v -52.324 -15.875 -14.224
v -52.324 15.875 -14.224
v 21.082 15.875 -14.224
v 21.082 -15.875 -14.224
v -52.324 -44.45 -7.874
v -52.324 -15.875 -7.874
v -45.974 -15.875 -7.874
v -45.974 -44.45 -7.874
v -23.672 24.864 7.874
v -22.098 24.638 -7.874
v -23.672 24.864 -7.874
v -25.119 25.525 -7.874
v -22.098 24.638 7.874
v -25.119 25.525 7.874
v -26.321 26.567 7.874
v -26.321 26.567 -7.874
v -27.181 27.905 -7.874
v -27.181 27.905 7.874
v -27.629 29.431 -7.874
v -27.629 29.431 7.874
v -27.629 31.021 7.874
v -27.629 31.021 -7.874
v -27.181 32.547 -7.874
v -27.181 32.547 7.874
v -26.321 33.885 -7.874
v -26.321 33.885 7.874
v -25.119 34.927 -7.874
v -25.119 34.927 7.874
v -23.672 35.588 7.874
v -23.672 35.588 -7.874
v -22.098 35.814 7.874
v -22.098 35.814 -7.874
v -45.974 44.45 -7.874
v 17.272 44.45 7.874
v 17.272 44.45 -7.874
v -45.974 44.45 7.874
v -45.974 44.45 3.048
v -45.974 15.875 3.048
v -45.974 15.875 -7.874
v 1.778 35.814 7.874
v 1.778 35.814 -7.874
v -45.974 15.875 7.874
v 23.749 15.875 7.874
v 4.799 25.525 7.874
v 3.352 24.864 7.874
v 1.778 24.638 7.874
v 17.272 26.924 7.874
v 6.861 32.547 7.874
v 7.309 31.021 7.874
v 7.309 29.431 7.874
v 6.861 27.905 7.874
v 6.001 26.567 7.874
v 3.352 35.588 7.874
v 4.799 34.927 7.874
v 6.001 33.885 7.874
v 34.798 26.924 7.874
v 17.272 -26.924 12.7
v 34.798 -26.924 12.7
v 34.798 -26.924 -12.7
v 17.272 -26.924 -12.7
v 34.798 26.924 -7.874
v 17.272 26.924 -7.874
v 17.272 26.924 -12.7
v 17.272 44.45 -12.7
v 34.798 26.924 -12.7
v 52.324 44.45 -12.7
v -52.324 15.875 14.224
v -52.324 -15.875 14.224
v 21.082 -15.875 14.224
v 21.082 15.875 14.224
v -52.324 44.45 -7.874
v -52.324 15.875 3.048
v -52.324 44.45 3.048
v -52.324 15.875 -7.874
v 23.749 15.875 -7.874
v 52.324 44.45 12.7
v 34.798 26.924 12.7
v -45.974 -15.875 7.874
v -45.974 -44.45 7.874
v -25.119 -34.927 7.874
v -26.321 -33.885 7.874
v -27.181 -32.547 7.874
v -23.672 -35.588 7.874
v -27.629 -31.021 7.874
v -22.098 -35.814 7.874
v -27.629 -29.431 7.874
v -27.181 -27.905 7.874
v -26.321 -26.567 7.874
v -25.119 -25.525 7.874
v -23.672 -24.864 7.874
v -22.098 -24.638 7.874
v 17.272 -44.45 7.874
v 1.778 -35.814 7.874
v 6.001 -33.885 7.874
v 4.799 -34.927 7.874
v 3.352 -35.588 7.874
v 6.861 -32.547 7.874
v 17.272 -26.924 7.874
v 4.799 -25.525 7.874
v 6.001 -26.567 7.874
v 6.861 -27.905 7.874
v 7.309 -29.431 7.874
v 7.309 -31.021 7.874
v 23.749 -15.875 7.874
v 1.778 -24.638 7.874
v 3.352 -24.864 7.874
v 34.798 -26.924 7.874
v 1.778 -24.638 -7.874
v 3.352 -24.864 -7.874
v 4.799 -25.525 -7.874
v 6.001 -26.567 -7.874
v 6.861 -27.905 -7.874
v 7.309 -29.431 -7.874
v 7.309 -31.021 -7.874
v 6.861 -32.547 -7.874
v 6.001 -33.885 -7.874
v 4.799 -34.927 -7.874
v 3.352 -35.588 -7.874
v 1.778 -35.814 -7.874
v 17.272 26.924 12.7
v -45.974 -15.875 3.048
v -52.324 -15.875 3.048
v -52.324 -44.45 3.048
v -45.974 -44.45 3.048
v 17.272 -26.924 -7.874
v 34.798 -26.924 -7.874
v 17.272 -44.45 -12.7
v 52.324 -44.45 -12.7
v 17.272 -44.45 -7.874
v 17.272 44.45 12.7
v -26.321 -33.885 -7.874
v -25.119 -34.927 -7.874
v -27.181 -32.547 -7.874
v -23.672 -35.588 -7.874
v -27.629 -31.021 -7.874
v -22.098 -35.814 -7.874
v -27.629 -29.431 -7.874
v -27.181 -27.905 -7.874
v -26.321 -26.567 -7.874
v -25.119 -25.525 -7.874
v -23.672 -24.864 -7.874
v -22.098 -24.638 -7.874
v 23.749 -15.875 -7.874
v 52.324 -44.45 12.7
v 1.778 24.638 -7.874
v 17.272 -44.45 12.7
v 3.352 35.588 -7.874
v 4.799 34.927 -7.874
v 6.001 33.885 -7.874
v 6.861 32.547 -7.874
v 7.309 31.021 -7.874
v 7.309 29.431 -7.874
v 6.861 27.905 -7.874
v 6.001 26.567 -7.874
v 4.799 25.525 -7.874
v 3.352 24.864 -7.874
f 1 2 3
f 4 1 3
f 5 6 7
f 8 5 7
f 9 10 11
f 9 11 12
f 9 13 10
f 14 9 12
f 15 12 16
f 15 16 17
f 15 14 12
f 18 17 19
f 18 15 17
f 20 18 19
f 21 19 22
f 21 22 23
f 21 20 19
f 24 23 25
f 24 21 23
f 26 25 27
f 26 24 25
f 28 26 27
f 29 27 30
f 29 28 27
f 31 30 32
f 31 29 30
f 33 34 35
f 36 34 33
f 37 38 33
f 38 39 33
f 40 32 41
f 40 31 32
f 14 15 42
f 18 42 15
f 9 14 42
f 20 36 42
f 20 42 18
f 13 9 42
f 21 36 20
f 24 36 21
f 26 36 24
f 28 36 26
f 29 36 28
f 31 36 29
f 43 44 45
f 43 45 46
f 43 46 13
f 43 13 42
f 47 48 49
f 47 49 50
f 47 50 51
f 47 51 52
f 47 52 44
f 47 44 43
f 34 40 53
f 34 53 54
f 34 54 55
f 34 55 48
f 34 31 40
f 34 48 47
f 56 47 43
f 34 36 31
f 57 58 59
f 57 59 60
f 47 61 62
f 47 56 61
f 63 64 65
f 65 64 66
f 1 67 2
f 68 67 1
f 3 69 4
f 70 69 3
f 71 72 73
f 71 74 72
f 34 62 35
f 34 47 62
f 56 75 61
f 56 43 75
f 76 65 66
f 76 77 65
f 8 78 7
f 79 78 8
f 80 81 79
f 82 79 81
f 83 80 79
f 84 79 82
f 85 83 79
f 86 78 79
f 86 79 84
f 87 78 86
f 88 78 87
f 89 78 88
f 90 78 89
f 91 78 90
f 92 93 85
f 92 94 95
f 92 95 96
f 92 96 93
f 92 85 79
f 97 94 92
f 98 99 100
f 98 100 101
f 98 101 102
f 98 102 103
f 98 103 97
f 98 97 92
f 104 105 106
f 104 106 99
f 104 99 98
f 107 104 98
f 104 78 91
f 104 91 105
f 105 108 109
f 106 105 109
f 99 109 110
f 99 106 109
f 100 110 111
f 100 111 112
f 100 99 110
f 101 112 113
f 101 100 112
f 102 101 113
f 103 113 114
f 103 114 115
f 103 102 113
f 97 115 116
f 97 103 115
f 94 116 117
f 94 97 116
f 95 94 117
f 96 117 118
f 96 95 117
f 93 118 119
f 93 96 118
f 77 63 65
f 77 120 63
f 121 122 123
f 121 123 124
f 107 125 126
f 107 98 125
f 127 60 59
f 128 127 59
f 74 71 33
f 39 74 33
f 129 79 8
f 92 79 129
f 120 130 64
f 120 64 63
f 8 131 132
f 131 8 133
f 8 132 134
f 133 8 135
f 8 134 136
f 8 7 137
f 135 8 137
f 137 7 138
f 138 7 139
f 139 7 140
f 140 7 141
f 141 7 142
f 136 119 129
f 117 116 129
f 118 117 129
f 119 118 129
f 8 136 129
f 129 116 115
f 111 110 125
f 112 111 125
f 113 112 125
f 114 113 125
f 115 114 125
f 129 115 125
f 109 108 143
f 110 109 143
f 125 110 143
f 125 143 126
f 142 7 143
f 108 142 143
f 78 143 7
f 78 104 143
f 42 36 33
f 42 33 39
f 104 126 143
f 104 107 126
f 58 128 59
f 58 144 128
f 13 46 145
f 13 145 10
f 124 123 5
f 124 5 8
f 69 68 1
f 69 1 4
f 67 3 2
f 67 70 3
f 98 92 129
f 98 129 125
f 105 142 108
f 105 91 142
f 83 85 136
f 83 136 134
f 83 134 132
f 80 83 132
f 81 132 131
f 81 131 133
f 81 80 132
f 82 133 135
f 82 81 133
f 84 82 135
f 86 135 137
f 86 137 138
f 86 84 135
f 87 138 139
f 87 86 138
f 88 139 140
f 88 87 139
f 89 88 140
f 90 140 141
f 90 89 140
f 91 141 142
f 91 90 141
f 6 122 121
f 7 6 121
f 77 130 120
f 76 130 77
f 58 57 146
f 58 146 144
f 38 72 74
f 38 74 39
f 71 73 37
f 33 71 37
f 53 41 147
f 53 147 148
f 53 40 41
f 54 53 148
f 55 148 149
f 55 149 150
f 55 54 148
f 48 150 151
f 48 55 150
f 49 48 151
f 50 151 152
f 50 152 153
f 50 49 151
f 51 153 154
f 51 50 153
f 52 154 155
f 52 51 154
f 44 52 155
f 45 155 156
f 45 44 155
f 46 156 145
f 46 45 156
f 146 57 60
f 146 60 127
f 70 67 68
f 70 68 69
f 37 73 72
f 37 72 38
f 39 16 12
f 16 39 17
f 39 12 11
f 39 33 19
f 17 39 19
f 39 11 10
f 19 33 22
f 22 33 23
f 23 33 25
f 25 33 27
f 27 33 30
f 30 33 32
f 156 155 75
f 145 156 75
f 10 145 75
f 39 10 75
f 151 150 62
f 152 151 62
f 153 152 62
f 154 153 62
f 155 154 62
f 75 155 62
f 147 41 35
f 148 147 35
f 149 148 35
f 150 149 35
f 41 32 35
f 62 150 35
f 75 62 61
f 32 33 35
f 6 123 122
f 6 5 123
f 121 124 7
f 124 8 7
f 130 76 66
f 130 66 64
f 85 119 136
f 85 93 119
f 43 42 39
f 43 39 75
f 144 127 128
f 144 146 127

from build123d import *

# Parameters (mm, degrees)
F1_DEPTH = 14.224
F2_DEPTH = 12.7
F3_DEPTH = 7.874
F0_W     = 6.35
F0_H     = 28.575
F4_DEPTH = 7.874
F5_DEPTH = 3.048


with BuildPart() as f1:
    # F0 (on Top) → F1 (new body, symmetric)
    with BuildSketch(Plane.XY):
        Polygon((21.082, 15.875), (-45.974, 15.875), (-52.324, 15.875), (-52.324, -15.875), (-45.974, -15.875), (21.082, -15.875), align=None)
    extrude(amount=F1_DEPTH, both=True)


with BuildPart() as f2:
    # F0 (on Top) → F2 (new body, symmetric)
    with BuildSketch(Plane.XY):
        Polygon((34.798, 26.924), (52.324, 44.45), (17.272, 44.45), (17.272, 26.924), align=None)
    extrude(amount=F2_DEPTH, both=True)


with BuildPart() as f2b:
    # F0 (on Top) → F2, piece 2 (new body, symmetric)
    with BuildSketch(Plane.XY):
        Polygon((52.324, -44.45), (34.798, -26.924), (17.272, -26.924), (17.272, -44.45), align=None)
    extrude(amount=F2_DEPTH, both=True)


with BuildPart() as f3:
    # F0 (on Top) → F3 (new body, symmetric)
    with BuildSketch(Plane.XY):
        Polygon((17.272, 26.924), (17.272, 44.45), (-45.974, 44.45), (-45.974, 15.875), (21.082, 15.875), (23.749, 15.875), (34.798, 26.924), align=None)
        with BuildLine():
            Line((1.778, 24.638), (-22.098, 24.638))
            ThreePointArc((-22.098, 24.638), (-27.686, 30.226), (-22.098, 35.814))
            Line((-22.098, 35.814), (1.778, 35.814))
            ThreePointArc((1.778, 35.814), (7.366, 30.226), (1.778, 24.638))
        make_face(mode=Mode.SUBTRACT)
    extrude(amount=F3_DEPTH, both=True)


with BuildPart() as f3b:
    # F0 (on Top) → F3, piece 2 (new body, symmetric)
    with BuildSketch(Plane.XY):
        Polygon((23.749, -15.875), (21.082, -15.875), (-45.974, -15.875), (-45.974, -44.45), (17.272, -44.45), (17.272, -26.924), (34.798, -26.924), align=None)
        with BuildLine():
            ThreePointArc((-22.098, -35.814), (-27.686, -30.226), (-22.098, -24.638))
            Line((-22.098, -24.638), (1.778, -24.638))
            ThreePointArc((1.778, -24.638), (7.366, -30.226), (1.778, -35.814))
            Line((1.778, -35.814), (-22.098, -35.814))
        make_face(mode=Mode.SUBTRACT)
    extrude(amount=F3_DEPTH, both=True)


with BuildPart() as f4:
    # F0 (on Top) → F4 (new body)
    with BuildSketch(Plane.XY):
        with Locations((-49.149, -30.1625)):
            Rectangle(F0_W, F0_H)
    extrude(amount=-F4_DEPTH)

    # F0 (on Top) → F5, piece 2 (join)
    with BuildSketch(Plane.XY):
        with Locations((-49.149, -30.1625)):
            Rectangle(F0_W, F0_H)
    extrude(amount=F5_DEPTH)


with BuildPart() as f4b:
    # F0 (on Top) → F4, piece 2 (new body)
    with BuildSketch(Plane.XY):
        with Locations((-49.149, 30.1625)):
            Rectangle(F0_W, F0_H)
    extrude(amount=-F4_DEPTH)

    # F0 (on Top) → F5 (join)
    with BuildSketch(Plane.XY):
        with Locations((-49.149, 30.1625)):
            Rectangle(F0_W, F0_H)
    extrude(amount=F5_DEPTH)


solid = Compound([f1.part, f2.part, f2b.part, f3.part, f3b.part, f4.part, f4b.part])
